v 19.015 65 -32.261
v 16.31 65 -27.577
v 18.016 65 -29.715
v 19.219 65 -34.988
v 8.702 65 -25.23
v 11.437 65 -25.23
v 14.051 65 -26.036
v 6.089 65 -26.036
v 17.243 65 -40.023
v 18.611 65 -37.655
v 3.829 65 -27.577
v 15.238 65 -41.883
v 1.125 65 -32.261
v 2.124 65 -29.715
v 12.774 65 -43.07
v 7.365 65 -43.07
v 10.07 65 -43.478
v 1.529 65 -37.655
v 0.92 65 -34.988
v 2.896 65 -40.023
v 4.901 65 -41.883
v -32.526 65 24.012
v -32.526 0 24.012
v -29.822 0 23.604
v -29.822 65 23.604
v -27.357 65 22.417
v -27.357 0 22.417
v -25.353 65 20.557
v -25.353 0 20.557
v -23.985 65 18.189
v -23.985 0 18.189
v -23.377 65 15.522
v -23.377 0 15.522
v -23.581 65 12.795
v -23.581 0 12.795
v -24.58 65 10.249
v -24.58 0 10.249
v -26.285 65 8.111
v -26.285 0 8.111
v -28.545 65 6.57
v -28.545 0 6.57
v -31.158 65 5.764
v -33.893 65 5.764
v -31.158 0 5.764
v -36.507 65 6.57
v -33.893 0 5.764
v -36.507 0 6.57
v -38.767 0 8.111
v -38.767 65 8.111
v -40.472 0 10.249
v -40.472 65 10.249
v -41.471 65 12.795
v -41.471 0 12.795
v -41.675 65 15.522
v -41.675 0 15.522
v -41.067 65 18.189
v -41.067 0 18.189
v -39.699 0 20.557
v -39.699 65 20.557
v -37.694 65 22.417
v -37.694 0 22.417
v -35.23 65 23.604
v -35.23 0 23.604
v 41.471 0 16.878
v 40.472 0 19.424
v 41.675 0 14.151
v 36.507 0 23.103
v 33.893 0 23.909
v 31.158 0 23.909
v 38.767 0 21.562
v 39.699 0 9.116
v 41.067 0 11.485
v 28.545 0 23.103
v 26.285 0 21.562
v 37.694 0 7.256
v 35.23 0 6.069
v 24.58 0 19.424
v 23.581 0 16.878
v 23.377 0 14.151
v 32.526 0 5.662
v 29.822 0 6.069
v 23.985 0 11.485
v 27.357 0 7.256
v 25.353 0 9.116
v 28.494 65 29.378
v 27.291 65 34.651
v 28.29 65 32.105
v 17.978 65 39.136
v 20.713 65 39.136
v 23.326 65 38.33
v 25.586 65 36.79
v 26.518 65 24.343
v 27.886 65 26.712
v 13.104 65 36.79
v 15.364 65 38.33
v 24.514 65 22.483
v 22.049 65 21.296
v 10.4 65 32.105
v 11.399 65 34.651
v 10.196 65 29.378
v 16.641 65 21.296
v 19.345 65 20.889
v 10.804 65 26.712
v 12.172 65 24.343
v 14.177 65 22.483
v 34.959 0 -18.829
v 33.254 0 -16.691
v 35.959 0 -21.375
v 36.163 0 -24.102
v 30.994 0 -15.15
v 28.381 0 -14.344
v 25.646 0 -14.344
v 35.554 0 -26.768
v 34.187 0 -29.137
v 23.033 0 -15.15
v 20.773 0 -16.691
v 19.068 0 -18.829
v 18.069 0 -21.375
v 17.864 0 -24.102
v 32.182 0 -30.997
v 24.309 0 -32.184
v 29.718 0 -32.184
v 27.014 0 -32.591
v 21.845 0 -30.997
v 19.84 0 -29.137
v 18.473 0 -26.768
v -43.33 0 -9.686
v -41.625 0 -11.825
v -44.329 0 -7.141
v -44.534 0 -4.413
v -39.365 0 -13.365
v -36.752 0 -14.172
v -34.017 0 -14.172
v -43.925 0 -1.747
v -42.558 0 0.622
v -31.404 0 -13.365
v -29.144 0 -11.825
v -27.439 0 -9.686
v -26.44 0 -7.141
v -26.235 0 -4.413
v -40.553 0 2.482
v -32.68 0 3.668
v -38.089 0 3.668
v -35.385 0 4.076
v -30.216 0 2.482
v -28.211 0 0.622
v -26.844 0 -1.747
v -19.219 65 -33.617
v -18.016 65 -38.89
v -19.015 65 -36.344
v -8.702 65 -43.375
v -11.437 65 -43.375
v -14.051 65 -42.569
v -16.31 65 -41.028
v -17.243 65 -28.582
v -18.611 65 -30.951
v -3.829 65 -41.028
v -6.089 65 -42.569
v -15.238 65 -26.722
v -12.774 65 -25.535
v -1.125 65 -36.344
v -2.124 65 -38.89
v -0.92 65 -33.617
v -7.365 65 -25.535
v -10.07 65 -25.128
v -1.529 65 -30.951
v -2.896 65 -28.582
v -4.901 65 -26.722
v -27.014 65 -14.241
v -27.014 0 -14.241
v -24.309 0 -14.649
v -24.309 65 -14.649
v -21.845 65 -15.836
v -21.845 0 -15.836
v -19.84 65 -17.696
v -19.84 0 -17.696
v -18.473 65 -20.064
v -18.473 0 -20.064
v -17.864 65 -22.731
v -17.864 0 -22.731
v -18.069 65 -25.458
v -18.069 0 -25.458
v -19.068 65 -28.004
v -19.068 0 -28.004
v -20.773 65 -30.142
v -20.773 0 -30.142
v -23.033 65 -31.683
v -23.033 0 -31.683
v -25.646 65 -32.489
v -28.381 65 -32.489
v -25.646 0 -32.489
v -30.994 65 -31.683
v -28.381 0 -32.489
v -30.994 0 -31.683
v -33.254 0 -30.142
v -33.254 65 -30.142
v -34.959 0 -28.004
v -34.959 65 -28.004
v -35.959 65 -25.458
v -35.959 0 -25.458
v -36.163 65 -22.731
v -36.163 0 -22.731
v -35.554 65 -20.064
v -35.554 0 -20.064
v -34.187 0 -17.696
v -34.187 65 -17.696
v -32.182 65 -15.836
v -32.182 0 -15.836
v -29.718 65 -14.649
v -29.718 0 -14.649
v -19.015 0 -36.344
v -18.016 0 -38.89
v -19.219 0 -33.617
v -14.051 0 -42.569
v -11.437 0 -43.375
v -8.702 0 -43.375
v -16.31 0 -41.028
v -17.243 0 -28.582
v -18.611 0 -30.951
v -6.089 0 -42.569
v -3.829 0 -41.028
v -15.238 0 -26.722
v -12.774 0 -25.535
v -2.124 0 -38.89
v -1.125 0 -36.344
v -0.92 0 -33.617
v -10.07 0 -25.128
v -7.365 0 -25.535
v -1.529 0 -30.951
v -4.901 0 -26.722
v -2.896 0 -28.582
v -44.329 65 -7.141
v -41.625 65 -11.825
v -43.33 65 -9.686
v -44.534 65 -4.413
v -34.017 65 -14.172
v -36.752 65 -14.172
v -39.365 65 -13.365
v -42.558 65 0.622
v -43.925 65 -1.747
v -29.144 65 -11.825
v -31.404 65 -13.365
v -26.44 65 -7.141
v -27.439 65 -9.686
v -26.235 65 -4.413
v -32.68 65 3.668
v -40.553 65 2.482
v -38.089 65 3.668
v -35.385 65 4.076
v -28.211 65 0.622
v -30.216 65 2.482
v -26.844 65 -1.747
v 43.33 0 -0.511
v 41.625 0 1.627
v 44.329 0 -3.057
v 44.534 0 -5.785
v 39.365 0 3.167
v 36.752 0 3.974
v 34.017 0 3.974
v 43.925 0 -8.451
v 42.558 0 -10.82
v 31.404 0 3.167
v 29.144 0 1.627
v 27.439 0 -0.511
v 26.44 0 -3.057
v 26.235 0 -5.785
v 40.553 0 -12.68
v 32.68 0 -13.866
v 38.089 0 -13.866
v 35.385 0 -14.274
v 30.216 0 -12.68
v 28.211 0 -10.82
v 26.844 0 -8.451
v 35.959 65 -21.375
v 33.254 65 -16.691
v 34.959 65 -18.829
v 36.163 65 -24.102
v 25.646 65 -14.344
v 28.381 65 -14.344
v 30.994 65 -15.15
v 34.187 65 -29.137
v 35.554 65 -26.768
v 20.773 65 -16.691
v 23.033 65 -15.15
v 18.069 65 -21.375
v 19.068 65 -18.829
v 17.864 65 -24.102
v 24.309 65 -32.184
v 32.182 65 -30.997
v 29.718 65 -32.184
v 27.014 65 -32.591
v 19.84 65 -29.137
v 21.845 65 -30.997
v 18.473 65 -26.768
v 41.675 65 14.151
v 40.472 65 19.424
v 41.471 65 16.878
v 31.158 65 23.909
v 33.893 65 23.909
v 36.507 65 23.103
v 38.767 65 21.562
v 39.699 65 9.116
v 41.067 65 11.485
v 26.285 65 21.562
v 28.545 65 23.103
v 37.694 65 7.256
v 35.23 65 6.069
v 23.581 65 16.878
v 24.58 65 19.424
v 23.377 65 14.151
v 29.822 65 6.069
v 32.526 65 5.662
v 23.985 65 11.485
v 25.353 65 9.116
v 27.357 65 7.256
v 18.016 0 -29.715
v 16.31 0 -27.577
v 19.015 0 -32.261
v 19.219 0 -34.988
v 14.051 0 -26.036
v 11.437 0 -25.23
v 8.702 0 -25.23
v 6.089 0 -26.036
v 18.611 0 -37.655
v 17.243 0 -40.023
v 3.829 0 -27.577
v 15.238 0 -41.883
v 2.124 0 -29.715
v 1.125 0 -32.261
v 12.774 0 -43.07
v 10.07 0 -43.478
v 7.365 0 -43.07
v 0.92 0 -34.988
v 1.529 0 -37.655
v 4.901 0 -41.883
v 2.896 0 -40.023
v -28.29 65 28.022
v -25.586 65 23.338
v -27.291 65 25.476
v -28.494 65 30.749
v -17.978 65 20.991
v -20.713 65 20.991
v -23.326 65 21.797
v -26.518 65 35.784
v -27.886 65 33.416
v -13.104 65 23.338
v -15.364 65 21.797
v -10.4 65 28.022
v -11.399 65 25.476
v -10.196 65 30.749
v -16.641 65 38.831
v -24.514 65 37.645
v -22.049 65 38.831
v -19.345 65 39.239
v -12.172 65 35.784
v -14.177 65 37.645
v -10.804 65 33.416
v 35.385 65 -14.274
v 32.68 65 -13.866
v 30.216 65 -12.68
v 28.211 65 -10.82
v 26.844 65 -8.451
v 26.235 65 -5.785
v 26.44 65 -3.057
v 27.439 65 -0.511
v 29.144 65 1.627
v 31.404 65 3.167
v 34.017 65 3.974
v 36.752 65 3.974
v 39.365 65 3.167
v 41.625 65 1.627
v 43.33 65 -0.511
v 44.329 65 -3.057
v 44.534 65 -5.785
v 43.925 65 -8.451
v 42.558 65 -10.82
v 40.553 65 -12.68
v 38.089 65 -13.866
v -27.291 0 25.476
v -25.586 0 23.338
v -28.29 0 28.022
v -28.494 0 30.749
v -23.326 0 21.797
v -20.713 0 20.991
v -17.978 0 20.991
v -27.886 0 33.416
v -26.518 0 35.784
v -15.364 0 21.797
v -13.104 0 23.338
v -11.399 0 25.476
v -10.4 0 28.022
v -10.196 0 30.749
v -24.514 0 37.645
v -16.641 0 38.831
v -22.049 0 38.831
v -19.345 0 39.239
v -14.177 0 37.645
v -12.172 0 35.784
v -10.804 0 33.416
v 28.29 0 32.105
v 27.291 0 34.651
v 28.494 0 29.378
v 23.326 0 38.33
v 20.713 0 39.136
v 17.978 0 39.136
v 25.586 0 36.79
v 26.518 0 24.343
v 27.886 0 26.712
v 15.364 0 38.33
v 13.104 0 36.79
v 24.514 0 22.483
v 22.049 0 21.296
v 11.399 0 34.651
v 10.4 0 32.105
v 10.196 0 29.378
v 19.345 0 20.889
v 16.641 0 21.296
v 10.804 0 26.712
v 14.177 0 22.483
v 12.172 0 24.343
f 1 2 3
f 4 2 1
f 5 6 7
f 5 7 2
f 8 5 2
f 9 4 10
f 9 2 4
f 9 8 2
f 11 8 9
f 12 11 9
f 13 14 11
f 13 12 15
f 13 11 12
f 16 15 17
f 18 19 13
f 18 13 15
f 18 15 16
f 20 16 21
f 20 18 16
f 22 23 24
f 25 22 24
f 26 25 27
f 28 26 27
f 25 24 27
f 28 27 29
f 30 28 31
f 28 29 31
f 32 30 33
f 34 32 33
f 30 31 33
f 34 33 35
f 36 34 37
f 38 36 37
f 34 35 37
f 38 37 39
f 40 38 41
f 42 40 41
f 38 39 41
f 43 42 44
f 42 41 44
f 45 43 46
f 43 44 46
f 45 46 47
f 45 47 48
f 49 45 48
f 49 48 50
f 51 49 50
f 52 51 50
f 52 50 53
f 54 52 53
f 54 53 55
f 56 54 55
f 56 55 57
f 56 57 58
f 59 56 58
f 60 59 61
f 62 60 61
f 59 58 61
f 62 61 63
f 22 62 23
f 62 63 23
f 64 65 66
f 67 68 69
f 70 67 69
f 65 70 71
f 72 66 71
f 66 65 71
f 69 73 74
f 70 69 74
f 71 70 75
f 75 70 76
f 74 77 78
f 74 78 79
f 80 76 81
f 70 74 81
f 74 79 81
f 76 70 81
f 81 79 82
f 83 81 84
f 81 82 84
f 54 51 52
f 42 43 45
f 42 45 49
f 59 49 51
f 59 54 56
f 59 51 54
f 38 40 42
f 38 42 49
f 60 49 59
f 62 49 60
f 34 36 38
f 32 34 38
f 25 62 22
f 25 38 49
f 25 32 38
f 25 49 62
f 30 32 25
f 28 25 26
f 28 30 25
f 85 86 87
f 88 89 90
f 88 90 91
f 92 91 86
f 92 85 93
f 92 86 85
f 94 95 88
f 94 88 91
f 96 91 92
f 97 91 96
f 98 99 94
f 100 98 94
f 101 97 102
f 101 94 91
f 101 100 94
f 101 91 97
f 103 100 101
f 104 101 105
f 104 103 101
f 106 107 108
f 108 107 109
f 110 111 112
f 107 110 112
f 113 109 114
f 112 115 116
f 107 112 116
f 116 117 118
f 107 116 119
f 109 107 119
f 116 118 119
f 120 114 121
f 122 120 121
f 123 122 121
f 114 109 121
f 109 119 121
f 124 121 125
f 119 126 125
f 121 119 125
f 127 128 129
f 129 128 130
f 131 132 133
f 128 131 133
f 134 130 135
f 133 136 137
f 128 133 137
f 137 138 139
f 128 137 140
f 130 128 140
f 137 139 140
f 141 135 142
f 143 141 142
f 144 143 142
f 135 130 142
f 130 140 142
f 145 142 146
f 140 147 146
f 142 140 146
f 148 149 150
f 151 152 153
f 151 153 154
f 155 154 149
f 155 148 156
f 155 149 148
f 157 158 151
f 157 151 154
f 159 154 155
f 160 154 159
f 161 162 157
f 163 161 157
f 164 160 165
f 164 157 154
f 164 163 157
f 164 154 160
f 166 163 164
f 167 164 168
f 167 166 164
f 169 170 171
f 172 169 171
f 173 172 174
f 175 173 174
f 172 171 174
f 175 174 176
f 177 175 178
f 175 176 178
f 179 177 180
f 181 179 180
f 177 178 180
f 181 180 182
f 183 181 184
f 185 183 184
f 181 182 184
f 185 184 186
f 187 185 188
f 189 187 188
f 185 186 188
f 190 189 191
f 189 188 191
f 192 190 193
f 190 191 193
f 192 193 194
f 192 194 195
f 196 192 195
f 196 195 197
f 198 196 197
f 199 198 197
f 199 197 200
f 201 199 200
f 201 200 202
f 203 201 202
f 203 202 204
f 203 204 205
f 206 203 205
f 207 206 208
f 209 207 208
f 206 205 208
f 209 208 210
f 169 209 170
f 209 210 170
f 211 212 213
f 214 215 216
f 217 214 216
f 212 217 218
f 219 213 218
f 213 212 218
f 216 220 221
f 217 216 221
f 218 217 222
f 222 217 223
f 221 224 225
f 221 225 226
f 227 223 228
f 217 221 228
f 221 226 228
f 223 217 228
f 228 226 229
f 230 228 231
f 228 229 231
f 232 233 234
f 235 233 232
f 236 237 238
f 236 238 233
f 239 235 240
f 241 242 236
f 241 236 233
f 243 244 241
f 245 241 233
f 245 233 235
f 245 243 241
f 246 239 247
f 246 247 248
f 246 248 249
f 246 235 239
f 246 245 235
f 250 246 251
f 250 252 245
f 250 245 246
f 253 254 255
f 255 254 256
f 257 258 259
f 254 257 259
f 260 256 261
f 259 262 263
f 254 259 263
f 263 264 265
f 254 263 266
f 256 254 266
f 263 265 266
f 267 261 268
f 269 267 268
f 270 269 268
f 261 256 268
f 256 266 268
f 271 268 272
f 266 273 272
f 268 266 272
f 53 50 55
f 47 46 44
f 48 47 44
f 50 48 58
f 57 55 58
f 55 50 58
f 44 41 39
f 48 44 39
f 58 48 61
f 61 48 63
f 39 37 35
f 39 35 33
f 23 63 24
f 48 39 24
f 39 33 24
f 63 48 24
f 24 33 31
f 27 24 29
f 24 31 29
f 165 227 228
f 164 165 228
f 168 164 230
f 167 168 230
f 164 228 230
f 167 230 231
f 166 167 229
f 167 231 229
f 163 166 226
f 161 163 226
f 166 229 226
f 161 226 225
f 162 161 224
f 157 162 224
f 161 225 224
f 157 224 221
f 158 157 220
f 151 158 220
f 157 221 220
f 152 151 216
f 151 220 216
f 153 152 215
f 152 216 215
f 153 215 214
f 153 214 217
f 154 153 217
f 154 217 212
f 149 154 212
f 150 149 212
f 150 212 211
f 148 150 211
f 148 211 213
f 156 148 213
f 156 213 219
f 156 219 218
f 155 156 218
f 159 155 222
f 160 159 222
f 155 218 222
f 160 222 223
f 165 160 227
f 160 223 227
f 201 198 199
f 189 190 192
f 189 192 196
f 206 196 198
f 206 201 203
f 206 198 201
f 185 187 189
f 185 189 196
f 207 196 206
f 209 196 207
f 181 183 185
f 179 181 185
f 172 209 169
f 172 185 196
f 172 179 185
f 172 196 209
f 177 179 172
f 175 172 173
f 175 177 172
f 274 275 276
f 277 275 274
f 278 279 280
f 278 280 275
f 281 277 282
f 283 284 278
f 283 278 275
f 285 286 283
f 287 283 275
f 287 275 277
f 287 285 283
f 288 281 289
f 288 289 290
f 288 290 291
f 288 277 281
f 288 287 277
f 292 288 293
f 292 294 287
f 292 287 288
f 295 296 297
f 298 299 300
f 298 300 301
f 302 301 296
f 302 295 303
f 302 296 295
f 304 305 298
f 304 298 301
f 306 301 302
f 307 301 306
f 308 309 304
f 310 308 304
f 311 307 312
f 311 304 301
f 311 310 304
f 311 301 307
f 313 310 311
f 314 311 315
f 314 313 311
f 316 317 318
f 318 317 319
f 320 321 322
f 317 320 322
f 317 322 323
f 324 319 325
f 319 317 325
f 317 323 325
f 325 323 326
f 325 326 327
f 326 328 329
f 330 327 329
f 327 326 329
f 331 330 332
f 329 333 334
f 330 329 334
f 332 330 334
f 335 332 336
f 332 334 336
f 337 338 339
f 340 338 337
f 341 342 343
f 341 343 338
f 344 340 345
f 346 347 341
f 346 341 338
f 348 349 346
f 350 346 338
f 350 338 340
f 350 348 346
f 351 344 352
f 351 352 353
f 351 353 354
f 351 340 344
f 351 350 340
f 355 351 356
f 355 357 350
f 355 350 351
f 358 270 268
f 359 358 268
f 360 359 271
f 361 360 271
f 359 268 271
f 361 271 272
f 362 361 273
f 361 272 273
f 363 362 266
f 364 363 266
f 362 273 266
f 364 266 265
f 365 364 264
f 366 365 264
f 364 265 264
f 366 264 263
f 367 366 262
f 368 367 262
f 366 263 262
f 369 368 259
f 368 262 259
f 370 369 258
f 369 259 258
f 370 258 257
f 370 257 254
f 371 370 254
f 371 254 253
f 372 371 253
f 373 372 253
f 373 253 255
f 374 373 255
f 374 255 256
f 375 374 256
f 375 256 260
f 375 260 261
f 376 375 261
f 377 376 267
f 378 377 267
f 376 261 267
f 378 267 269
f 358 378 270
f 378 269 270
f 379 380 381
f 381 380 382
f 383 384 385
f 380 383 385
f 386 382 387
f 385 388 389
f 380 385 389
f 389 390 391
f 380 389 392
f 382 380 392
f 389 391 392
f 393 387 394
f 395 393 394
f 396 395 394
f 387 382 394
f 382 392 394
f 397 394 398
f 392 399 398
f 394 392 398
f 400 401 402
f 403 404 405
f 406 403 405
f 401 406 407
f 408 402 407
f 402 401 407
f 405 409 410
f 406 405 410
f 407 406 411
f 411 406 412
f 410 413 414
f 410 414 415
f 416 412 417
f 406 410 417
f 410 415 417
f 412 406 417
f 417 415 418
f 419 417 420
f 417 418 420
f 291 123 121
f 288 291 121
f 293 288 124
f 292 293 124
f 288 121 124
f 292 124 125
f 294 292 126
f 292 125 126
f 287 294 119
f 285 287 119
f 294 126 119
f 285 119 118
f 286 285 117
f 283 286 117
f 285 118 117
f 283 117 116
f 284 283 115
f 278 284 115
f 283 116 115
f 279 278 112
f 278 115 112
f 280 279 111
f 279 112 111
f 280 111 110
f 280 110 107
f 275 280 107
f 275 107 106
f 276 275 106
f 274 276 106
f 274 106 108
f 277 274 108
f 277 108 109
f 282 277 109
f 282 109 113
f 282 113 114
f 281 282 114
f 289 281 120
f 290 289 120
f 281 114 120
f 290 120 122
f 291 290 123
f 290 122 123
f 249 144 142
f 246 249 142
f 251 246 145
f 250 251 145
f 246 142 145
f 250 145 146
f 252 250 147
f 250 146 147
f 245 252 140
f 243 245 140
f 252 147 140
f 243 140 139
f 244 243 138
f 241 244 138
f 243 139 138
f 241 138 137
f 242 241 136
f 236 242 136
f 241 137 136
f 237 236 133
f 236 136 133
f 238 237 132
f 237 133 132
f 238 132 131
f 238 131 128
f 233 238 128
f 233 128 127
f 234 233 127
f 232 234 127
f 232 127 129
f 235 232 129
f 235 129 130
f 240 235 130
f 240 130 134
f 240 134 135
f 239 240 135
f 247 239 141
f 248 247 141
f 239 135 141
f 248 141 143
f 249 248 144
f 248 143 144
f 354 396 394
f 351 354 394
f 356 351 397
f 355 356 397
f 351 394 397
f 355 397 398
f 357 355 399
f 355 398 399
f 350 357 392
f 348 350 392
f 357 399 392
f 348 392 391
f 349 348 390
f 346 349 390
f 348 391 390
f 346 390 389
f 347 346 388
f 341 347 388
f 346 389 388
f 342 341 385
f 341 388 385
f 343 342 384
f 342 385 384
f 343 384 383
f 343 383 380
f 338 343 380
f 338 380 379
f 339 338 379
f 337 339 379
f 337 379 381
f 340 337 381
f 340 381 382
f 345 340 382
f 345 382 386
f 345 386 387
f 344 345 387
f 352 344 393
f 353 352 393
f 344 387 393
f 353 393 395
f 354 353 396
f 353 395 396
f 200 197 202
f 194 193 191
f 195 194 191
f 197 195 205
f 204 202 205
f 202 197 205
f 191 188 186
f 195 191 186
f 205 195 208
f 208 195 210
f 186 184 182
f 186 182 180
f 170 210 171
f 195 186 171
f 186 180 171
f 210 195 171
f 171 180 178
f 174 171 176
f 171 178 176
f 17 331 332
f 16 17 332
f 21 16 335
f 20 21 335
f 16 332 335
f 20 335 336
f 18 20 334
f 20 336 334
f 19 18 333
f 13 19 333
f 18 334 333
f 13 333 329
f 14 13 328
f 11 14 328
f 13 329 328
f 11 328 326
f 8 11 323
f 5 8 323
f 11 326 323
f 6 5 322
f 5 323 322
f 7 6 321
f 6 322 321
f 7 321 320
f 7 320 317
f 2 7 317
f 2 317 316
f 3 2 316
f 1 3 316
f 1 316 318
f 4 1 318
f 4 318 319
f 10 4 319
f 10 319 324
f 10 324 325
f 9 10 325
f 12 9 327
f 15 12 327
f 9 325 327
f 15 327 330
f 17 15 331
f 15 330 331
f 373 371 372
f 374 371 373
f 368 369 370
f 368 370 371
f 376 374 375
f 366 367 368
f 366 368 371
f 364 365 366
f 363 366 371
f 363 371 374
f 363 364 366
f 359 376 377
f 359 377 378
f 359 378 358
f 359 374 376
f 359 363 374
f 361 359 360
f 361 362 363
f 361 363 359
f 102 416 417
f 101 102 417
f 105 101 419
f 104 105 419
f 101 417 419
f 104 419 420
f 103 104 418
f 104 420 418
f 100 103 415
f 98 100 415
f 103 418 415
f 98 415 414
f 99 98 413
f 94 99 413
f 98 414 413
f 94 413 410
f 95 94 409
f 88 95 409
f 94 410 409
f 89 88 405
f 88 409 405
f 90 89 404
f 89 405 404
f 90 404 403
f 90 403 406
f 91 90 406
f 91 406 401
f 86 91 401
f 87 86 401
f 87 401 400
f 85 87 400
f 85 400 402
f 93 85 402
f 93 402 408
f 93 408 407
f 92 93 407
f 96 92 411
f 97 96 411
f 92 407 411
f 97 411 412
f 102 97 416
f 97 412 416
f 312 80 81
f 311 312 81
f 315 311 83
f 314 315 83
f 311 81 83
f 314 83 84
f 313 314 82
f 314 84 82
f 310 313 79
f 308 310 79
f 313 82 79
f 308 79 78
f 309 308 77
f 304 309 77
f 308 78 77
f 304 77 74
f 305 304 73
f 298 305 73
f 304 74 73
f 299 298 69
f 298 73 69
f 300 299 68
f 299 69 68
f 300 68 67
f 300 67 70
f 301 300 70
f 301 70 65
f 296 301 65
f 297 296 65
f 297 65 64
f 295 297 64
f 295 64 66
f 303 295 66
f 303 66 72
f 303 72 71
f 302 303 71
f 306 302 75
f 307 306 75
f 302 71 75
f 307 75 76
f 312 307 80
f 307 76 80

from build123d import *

# Parameters (mm, degrees)
SKETCH1_R              = 9.175
BOSS_EXTRUDE1_DEPTH    = 65
BOSS_EXTRUDE1_2_DEPTH  = 65
BOSS_EXTRUDE1_3_DEPTH  = 65
BOSS_EXTRUDE1_4_DEPTH  = 65
BOSS_EXTRUDE1_5_DEPTH  = 65
BOSS_EXTRUDE1_6_DEPTH  = 65
BOSS_EXTRUDE1_7_DEPTH  = 65
BOSS_EXTRUDE1_8_DEPTH  = 65
BOSS_EXTRUDE1_9_DEPTH  = 65
BOSS_EXTRUDE1_10_DEPTH = 65


with BuildPart() as part:
    # Sketch1 → Boss-Extrude1 (new body)
    with BuildSketch(Plane(origin=(0, 0, 0), x_dir=(1, 0, 0), z_dir=(0, 1, 0))):
        with Locations(Location((-10.069761866, 34.302512969, 0), (0, 0, 270))):
            Circle(SKETCH1_R)
    extrude(amount=BOSS_EXTRUDE1_DEPTH)


with BuildPart() as body_2:
    # Sketch1 → Boss-Extrude1 2 (new body)
    with BuildSketch(Plane(origin=(0, 0, 0), x_dir=(1, 0, 0), z_dir=(0, 1, 0))):
        with Locations(Location((-27.013589298, 23.416415038, 0), (0, 0, 270))):
            Circle(SKETCH1_R)
    extrude(amount=BOSS_EXTRUDE1_2_DEPTH)


with BuildPart() as body_3:
    # Sketch1 → Boss-Extrude1 3 (new body)
    with BuildSketch(Plane(origin=(0, 0, 0), x_dir=(1, 0, 0), z_dir=(0, 1, 0))):
        with Locations(Location((-35.384500255, 5.09898438, 0), (0, 0, 270))):
            Circle(SKETCH1_R)
    extrude(amount=BOSS_EXTRUDE1_3_DEPTH)


with BuildPart() as body_4:
    # Sketch1 → Boss-Extrude1 4 (new body)
    with BuildSketch(Plane(origin=(0, 0, 0), x_dir=(1, 0, 0), z_dir=(0, 1, 0))):
        with Locations(Location((-32.525938452, -14.836638023, 0), (0, 0, 270))):
            Circle(SKETCH1_R)
    extrude(amount=BOSS_EXTRUDE1_4_DEPTH)


with BuildPart() as body_5:
    # Sketch1 → Boss-Extrude1 5 (new body)
    with BuildSketch(Plane(origin=(0, 0, 0), x_dir=(1, 0, 0), z_dir=(0, 1, 0))):
        with Locations(Location((-19.345084764, -30.063768817, 0), (0, 0, 270))):
            Circle(SKETCH1_R)
    extrude(amount=BOSS_EXTRUDE1_5_DEPTH)


with BuildPart() as body_6:
    # Sketch1 → Boss-Extrude1 6 (new body)
    with BuildSketch(Plane(origin=(0, 0, 0), x_dir=(1, 0, 0), z_dir=(0, 1, 0))):
        with Locations(Location((19.345084764, -30.063768817, 0), (0, 0, 90))):
            Circle(SKETCH1_R)
    extrude(amount=BOSS_EXTRUDE1_6_DEPTH)


with BuildPart() as body_7:
    # Sketch1 → Boss-Extrude1 7 (new body)
    with BuildSketch(Plane(origin=(0, 0, 0), x_dir=(1, 0, 0), z_dir=(0, 1, 0))):
        with Locations(Location((32.525938452, -14.836638023, 0), (0, 0, 90))):
            Circle(SKETCH1_R)
    extrude(amount=BOSS_EXTRUDE1_7_DEPTH)


with BuildPart() as body_8:
    # Sketch1 → Boss-Extrude1 8 (new body)
    with BuildSketch(Plane(origin=(0, 0, 0), x_dir=(1, 0, 0), z_dir=(0, 1, 0))):
        with Locations(Location((35.384500255, 5.09898438, 0), (0, 0, 90))):
            Circle(SKETCH1_R)
    extrude(amount=BOSS_EXTRUDE1_8_DEPTH)


with BuildPart() as body_9:
    # Sketch1 → Boss-Extrude1 9 (new body)
    with BuildSketch(Plane(origin=(0, 0, 0), x_dir=(1, 0, 0), z_dir=(0, 1, 0))):
        with Locations(Location((27.013589298, 23.416415038, 0), (0, 0, 90))):
            Circle(SKETCH1_R)
    extrude(amount=BOSS_EXTRUDE1_9_DEPTH)


with BuildPart() as body_10:
    # Sketch1 → Boss-Extrude1 10 (new body)
    with BuildSketch(Plane(origin=(0, 0, 0), x_dir=(1, 0, 0), z_dir=(0, 1, 0))):
        with Locations(Location((10.069761866, 34.302512969, 0), (0, 0, 90))):
            Circle(SKETCH1_R)
    extrude(amount=BOSS_EXTRUDE1_10_DEPTH)


solid = Compound([part.part, body_2.part, body_3.part, body_4.part, body_5.part, body_6.part, body_7.part, body_8.part, body_9.part, body_10.part])
